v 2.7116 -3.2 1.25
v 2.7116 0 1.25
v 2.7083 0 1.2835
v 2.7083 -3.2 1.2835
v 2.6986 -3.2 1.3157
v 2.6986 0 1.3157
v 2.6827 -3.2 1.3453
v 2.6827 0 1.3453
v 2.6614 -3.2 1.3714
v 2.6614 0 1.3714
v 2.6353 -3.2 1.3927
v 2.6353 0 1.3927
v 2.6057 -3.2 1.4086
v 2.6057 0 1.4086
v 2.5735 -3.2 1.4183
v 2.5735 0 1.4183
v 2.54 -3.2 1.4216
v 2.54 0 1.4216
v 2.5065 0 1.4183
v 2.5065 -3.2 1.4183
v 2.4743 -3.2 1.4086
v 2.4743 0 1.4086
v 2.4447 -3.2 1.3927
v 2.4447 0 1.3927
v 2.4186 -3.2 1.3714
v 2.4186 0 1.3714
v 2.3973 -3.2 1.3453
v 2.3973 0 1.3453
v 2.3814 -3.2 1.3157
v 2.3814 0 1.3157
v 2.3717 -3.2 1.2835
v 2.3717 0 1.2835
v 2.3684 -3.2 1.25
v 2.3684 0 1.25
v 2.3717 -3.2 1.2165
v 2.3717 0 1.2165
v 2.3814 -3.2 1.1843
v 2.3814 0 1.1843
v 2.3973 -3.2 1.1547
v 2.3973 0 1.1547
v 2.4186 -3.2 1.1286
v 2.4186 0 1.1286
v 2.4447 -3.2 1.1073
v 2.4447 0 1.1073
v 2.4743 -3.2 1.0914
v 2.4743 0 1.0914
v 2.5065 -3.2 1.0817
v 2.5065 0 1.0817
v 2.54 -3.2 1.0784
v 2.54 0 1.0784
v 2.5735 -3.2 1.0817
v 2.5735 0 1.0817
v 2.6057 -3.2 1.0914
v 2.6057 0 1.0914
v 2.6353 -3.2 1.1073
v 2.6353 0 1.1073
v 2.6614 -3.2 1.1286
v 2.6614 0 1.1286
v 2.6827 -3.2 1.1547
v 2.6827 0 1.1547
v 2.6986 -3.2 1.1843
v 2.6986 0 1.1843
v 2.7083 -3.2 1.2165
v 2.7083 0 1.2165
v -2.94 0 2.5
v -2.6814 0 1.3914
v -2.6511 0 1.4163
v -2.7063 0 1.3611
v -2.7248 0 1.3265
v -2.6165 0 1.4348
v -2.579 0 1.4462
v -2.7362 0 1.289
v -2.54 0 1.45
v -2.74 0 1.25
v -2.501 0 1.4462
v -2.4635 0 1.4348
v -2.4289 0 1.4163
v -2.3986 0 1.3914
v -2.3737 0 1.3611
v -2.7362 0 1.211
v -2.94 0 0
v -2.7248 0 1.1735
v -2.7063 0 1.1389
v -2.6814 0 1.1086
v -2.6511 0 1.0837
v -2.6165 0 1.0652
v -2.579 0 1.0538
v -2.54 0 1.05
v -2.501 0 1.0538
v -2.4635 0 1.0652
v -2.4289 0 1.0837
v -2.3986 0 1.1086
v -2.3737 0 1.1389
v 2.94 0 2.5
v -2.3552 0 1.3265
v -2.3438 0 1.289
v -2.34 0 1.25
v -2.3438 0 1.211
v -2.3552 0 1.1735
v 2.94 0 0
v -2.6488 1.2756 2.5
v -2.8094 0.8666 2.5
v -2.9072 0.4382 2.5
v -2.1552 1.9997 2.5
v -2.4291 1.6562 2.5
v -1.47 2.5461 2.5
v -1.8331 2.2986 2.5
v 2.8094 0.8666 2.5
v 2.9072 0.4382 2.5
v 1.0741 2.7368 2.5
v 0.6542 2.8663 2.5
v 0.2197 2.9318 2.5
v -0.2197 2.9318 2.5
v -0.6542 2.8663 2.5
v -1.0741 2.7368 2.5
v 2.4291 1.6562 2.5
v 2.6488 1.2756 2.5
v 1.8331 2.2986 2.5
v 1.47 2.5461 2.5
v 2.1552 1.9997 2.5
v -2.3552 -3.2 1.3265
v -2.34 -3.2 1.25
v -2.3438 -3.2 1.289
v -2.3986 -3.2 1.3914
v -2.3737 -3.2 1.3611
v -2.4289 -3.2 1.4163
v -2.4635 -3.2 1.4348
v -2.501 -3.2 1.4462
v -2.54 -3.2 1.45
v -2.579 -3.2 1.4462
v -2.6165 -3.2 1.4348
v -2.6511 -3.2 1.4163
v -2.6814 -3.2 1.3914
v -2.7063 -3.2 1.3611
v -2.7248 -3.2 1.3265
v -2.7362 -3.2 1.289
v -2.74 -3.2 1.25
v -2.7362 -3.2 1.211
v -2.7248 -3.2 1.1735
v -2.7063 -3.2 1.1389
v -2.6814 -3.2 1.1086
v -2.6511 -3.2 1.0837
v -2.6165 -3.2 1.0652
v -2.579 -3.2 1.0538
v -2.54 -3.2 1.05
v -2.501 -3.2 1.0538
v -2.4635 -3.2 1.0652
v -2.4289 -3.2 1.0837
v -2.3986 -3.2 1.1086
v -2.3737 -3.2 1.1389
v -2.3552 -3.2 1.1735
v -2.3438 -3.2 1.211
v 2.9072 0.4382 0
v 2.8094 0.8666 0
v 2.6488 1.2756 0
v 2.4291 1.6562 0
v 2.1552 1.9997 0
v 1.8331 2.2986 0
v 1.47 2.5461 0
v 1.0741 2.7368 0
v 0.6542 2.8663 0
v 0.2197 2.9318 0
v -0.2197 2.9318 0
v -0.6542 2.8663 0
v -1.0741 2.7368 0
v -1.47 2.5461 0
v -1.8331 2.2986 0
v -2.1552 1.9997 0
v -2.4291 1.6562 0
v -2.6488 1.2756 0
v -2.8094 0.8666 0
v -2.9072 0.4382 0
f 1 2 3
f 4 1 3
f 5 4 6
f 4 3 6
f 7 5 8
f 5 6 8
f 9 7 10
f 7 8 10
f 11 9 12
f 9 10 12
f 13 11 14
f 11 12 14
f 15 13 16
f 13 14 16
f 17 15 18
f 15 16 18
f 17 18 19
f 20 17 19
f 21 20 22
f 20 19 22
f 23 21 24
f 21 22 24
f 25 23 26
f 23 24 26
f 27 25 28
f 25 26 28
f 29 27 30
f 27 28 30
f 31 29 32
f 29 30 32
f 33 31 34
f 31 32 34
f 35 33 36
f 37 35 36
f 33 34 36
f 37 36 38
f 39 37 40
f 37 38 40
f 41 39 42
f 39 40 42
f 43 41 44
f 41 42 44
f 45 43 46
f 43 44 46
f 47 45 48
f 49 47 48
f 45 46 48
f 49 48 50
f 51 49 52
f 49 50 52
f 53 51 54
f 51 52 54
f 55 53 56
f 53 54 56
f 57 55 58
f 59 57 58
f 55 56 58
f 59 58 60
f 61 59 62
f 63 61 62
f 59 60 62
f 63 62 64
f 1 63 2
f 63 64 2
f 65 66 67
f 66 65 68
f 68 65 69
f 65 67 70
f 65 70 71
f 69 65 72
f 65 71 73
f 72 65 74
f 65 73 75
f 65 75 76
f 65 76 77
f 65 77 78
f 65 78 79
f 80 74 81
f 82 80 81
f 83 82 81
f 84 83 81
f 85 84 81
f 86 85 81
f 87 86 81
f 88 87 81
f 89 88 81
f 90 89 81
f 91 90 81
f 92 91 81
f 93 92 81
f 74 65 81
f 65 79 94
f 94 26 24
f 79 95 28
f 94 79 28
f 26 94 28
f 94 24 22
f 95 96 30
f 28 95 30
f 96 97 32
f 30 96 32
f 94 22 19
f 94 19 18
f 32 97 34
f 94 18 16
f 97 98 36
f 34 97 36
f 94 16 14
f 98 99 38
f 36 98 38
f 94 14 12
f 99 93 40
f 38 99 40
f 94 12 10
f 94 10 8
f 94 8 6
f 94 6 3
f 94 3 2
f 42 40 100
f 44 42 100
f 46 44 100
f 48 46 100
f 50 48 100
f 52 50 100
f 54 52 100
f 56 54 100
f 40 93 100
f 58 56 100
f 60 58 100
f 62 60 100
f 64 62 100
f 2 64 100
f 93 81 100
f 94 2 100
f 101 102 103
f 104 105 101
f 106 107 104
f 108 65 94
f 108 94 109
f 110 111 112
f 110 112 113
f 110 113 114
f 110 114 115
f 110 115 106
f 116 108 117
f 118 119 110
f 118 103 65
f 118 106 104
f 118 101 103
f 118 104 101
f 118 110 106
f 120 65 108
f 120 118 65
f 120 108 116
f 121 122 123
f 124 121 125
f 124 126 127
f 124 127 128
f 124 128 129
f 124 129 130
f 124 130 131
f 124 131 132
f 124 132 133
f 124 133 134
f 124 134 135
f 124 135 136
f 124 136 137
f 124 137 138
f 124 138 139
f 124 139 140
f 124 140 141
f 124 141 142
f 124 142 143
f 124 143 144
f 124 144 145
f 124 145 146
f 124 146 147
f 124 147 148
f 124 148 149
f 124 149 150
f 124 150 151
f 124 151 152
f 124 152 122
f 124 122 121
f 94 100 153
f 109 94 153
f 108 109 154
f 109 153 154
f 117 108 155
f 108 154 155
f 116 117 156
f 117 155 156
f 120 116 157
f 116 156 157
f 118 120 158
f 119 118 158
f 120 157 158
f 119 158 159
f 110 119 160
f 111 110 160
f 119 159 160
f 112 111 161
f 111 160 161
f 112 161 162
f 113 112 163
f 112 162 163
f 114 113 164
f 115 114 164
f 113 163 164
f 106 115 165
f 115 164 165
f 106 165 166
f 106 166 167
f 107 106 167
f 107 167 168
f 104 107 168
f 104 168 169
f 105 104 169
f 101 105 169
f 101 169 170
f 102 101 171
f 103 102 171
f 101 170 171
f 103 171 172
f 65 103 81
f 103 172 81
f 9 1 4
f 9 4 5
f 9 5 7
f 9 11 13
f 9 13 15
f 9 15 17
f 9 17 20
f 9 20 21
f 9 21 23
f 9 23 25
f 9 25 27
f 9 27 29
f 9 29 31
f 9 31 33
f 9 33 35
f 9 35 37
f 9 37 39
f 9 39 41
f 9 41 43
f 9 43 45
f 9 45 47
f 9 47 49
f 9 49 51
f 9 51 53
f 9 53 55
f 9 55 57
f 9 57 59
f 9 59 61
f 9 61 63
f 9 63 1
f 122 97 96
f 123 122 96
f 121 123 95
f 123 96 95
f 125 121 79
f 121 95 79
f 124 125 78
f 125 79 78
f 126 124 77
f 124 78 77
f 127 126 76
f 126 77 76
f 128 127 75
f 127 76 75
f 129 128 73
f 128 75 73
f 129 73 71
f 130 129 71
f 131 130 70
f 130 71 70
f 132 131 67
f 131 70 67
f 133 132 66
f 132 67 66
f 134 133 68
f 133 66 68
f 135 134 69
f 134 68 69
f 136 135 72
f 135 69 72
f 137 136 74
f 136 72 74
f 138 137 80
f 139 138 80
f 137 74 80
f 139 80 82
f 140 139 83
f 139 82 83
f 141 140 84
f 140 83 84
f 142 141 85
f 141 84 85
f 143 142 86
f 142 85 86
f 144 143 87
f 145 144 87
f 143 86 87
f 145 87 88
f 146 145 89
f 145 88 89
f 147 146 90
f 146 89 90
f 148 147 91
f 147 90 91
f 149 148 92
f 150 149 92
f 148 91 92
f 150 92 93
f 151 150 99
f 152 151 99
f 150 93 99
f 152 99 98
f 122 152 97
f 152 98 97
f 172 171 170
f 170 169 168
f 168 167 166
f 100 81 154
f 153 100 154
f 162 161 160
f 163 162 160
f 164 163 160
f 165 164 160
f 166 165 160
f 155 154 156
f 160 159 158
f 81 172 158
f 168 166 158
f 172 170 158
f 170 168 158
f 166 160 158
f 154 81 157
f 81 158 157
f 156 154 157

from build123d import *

# Parameters (mm, degrees)
BOSS_EXTRUDE1_DEPTH = 2.5
SKETCH2_R           = 0.2
SKETCH2_R_2         = 0.171619636
BOSS_EXTRUDE2_DEPTH = 3.2


with BuildPart() as part:
    # Sketch1 → Boss-Extrude1 (new body)
    with BuildSketch(Plane.XY):
        with BuildLine():
            Line((-2.94, 0), (2.94, 0))
            ThreePointArc((2.94, 0), (0, 2.94), (-2.94, 0))
        make_face()
    extrude(amount=BOSS_EXTRUDE1_DEPTH)

    # Sketch2 → Boss-Extrude2 (add)
    with BuildSketch(Plane.XZ):
        with Locations((-2.54, 1.25)):
            Circle(SKETCH2_R)
        with Locations((2.54, 1.25)):
            Circle(SKETCH2_R_2)
    extrude(amount=BOSS_EXTRUDE2_DEPTH)


solid = part.part
